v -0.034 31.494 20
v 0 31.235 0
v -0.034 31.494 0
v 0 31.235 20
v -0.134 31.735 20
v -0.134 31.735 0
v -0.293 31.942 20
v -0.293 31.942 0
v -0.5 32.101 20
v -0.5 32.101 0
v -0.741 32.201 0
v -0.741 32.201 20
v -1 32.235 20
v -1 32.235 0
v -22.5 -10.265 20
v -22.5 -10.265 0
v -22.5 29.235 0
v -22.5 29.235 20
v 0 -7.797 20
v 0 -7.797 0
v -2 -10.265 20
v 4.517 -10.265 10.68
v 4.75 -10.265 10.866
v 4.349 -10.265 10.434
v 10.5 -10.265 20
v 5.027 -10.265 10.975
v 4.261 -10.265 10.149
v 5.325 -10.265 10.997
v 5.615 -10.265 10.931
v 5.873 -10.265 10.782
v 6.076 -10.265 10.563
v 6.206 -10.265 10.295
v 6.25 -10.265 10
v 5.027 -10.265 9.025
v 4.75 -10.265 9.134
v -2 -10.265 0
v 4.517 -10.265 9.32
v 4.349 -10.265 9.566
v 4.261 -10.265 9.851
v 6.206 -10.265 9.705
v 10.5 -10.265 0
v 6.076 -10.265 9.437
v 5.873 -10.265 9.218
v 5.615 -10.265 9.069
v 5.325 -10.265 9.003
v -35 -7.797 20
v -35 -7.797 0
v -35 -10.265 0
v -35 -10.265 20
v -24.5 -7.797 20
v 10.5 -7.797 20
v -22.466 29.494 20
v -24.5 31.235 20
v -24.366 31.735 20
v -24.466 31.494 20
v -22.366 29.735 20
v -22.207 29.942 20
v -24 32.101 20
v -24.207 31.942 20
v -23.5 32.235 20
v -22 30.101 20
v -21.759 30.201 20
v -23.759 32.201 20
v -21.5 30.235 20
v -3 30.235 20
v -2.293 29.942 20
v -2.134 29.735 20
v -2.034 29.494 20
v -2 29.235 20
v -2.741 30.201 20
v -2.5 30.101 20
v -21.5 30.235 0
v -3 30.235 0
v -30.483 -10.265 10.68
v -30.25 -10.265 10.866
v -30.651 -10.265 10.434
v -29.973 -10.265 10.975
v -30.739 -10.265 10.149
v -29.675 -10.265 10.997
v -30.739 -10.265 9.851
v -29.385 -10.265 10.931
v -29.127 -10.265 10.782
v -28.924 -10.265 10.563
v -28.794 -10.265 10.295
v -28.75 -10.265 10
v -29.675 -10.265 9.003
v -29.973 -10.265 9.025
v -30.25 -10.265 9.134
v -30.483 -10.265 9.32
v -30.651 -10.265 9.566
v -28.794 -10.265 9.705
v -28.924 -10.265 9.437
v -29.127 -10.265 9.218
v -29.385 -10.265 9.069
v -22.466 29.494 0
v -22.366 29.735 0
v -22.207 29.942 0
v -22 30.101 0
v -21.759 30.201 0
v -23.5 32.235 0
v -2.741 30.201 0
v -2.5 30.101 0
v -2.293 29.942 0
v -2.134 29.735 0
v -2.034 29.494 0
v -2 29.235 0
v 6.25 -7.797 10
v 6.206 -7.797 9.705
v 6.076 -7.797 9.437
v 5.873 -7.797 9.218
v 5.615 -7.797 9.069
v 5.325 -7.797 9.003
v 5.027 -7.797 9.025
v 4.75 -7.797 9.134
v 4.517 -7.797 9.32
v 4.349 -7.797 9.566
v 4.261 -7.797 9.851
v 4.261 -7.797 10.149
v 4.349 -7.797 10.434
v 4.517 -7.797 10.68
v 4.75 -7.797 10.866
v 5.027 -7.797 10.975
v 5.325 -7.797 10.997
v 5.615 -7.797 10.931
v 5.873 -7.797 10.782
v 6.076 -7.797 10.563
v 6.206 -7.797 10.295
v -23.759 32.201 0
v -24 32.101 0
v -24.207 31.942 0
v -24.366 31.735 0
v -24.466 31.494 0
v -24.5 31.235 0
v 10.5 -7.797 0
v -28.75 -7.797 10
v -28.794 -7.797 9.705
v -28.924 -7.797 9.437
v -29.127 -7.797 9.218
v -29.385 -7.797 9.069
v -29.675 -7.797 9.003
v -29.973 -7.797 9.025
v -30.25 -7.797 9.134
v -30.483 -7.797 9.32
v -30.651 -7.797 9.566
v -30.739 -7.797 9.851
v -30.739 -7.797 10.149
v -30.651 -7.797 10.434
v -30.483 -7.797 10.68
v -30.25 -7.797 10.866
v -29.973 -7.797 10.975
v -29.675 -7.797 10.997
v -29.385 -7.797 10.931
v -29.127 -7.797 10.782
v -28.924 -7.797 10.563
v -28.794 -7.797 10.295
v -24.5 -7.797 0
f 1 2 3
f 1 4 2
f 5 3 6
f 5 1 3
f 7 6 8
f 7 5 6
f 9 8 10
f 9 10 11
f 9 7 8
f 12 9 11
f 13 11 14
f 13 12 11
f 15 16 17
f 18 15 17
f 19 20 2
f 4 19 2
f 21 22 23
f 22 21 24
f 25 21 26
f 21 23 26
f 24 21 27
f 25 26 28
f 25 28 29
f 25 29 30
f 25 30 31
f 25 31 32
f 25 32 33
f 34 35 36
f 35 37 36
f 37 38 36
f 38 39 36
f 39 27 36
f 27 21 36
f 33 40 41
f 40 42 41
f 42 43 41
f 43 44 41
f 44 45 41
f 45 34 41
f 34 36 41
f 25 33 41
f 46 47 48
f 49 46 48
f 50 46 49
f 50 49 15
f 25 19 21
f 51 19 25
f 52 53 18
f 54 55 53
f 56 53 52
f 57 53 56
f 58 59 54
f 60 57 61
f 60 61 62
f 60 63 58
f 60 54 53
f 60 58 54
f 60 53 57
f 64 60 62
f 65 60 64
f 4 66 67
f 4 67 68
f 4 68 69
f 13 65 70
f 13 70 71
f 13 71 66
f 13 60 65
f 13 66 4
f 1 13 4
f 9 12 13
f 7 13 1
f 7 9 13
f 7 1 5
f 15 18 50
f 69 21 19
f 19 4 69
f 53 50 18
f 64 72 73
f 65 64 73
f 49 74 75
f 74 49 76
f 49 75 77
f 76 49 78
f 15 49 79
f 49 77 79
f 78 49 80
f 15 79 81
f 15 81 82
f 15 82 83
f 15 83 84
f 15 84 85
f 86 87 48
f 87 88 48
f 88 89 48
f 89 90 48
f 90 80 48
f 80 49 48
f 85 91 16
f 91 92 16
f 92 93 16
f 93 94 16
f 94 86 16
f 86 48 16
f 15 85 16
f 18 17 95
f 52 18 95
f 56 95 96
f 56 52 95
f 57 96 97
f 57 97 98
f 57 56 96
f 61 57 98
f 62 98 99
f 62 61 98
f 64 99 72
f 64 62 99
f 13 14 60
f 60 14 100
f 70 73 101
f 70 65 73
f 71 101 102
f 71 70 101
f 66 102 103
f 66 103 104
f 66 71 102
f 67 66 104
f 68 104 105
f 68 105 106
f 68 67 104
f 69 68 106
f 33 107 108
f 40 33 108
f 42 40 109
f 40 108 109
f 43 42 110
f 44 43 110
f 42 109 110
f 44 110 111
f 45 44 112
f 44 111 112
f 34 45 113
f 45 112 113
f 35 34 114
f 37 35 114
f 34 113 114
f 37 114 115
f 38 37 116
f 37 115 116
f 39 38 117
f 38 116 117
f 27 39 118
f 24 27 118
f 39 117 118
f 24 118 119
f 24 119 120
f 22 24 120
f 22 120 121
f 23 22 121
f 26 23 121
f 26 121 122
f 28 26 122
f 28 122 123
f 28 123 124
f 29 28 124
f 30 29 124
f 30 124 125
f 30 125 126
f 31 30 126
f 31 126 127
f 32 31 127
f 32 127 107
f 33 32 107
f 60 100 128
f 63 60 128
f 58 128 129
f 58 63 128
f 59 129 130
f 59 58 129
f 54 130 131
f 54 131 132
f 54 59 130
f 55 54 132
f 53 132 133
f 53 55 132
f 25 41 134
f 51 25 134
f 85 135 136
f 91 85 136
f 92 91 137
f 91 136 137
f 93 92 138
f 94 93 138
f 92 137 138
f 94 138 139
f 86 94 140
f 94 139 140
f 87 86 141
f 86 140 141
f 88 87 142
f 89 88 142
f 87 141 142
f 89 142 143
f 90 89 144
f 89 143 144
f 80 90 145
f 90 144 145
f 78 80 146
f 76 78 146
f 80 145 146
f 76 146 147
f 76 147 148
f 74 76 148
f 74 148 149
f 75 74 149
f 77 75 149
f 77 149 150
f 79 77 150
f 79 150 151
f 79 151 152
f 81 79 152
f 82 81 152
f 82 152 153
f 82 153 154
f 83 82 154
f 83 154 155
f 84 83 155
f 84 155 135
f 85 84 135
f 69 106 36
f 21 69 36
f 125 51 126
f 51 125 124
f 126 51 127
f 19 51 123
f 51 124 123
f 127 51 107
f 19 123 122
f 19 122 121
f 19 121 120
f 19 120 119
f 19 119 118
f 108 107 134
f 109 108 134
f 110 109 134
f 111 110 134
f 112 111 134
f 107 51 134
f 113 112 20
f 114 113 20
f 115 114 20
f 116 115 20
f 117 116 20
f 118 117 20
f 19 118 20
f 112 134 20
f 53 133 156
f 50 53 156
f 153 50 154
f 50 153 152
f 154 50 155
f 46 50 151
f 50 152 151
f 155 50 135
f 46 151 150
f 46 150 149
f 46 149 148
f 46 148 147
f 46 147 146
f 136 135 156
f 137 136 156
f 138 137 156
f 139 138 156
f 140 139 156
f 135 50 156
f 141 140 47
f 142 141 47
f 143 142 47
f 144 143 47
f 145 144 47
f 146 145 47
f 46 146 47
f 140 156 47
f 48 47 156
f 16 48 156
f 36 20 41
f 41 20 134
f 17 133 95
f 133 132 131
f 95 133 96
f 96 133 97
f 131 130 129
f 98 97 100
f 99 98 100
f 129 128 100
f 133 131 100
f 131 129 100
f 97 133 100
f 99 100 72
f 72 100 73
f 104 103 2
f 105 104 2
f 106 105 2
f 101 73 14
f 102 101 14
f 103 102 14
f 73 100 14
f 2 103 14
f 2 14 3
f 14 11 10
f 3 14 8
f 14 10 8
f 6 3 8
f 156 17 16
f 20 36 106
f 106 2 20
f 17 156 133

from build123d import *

# Parameters (mm, degrees)
BOSS_EXTRUDE1_DEPTH = 20
FILLET1_R           = 1
SKETCH2_R           = 1
CUT_EXTRUDE1_DEPTH  = 20


with BuildPart() as part:
    # Sketch1 → Boss-Extrude1 (new body)
    with BuildSketch(Plane.XY):
        Polygon((-22.5, -10.265235457), (-22.5, 30.234764543), (-2, 30.234764543), (-2, -10.265235457), (0, -10.265235457), (10.5, -10.265235457), (10.5, -7.797091413), (0, -7.797091413), (0, 32.234764543), (-24.5, 32.234764543), (-24.5, -7.797091413), (-35, -7.797091413), (-35, -10.265235457), (-26.067867036, -10.265235457), align=None)
    extrude(amount=BOSS_EXTRUDE1_DEPTH)

    # Fillet1
    fillet1_edges = [part.edges().sort_by_distance(p)[0] for p in [
        (-22.5, 30.234764543, 10),
        (-2, 30.234764543, 10),
        (0, 32.234764543, 10),
        (-24.5, 32.234764543, 10),
    ]]
    fillet(fillet1_edges, radius=FILLET1_R)

    # Sketch2 → Cut-Extrude1 (cut)
    with BuildSketch(Plane(origin=(0, -7.797091413, 0), x_dir=(1, 0, 0), z_dir=(0, 1, 0))):
        with Locations((-29.75, -10)):
            Circle(SKETCH2_R)
        with Locations((5.25, -10)):
            Circle(SKETCH2_R)
    extrude(amount=-CUT_EXTRUDE1_DEPTH, mode=Mode.SUBTRACT)


solid = part.part
